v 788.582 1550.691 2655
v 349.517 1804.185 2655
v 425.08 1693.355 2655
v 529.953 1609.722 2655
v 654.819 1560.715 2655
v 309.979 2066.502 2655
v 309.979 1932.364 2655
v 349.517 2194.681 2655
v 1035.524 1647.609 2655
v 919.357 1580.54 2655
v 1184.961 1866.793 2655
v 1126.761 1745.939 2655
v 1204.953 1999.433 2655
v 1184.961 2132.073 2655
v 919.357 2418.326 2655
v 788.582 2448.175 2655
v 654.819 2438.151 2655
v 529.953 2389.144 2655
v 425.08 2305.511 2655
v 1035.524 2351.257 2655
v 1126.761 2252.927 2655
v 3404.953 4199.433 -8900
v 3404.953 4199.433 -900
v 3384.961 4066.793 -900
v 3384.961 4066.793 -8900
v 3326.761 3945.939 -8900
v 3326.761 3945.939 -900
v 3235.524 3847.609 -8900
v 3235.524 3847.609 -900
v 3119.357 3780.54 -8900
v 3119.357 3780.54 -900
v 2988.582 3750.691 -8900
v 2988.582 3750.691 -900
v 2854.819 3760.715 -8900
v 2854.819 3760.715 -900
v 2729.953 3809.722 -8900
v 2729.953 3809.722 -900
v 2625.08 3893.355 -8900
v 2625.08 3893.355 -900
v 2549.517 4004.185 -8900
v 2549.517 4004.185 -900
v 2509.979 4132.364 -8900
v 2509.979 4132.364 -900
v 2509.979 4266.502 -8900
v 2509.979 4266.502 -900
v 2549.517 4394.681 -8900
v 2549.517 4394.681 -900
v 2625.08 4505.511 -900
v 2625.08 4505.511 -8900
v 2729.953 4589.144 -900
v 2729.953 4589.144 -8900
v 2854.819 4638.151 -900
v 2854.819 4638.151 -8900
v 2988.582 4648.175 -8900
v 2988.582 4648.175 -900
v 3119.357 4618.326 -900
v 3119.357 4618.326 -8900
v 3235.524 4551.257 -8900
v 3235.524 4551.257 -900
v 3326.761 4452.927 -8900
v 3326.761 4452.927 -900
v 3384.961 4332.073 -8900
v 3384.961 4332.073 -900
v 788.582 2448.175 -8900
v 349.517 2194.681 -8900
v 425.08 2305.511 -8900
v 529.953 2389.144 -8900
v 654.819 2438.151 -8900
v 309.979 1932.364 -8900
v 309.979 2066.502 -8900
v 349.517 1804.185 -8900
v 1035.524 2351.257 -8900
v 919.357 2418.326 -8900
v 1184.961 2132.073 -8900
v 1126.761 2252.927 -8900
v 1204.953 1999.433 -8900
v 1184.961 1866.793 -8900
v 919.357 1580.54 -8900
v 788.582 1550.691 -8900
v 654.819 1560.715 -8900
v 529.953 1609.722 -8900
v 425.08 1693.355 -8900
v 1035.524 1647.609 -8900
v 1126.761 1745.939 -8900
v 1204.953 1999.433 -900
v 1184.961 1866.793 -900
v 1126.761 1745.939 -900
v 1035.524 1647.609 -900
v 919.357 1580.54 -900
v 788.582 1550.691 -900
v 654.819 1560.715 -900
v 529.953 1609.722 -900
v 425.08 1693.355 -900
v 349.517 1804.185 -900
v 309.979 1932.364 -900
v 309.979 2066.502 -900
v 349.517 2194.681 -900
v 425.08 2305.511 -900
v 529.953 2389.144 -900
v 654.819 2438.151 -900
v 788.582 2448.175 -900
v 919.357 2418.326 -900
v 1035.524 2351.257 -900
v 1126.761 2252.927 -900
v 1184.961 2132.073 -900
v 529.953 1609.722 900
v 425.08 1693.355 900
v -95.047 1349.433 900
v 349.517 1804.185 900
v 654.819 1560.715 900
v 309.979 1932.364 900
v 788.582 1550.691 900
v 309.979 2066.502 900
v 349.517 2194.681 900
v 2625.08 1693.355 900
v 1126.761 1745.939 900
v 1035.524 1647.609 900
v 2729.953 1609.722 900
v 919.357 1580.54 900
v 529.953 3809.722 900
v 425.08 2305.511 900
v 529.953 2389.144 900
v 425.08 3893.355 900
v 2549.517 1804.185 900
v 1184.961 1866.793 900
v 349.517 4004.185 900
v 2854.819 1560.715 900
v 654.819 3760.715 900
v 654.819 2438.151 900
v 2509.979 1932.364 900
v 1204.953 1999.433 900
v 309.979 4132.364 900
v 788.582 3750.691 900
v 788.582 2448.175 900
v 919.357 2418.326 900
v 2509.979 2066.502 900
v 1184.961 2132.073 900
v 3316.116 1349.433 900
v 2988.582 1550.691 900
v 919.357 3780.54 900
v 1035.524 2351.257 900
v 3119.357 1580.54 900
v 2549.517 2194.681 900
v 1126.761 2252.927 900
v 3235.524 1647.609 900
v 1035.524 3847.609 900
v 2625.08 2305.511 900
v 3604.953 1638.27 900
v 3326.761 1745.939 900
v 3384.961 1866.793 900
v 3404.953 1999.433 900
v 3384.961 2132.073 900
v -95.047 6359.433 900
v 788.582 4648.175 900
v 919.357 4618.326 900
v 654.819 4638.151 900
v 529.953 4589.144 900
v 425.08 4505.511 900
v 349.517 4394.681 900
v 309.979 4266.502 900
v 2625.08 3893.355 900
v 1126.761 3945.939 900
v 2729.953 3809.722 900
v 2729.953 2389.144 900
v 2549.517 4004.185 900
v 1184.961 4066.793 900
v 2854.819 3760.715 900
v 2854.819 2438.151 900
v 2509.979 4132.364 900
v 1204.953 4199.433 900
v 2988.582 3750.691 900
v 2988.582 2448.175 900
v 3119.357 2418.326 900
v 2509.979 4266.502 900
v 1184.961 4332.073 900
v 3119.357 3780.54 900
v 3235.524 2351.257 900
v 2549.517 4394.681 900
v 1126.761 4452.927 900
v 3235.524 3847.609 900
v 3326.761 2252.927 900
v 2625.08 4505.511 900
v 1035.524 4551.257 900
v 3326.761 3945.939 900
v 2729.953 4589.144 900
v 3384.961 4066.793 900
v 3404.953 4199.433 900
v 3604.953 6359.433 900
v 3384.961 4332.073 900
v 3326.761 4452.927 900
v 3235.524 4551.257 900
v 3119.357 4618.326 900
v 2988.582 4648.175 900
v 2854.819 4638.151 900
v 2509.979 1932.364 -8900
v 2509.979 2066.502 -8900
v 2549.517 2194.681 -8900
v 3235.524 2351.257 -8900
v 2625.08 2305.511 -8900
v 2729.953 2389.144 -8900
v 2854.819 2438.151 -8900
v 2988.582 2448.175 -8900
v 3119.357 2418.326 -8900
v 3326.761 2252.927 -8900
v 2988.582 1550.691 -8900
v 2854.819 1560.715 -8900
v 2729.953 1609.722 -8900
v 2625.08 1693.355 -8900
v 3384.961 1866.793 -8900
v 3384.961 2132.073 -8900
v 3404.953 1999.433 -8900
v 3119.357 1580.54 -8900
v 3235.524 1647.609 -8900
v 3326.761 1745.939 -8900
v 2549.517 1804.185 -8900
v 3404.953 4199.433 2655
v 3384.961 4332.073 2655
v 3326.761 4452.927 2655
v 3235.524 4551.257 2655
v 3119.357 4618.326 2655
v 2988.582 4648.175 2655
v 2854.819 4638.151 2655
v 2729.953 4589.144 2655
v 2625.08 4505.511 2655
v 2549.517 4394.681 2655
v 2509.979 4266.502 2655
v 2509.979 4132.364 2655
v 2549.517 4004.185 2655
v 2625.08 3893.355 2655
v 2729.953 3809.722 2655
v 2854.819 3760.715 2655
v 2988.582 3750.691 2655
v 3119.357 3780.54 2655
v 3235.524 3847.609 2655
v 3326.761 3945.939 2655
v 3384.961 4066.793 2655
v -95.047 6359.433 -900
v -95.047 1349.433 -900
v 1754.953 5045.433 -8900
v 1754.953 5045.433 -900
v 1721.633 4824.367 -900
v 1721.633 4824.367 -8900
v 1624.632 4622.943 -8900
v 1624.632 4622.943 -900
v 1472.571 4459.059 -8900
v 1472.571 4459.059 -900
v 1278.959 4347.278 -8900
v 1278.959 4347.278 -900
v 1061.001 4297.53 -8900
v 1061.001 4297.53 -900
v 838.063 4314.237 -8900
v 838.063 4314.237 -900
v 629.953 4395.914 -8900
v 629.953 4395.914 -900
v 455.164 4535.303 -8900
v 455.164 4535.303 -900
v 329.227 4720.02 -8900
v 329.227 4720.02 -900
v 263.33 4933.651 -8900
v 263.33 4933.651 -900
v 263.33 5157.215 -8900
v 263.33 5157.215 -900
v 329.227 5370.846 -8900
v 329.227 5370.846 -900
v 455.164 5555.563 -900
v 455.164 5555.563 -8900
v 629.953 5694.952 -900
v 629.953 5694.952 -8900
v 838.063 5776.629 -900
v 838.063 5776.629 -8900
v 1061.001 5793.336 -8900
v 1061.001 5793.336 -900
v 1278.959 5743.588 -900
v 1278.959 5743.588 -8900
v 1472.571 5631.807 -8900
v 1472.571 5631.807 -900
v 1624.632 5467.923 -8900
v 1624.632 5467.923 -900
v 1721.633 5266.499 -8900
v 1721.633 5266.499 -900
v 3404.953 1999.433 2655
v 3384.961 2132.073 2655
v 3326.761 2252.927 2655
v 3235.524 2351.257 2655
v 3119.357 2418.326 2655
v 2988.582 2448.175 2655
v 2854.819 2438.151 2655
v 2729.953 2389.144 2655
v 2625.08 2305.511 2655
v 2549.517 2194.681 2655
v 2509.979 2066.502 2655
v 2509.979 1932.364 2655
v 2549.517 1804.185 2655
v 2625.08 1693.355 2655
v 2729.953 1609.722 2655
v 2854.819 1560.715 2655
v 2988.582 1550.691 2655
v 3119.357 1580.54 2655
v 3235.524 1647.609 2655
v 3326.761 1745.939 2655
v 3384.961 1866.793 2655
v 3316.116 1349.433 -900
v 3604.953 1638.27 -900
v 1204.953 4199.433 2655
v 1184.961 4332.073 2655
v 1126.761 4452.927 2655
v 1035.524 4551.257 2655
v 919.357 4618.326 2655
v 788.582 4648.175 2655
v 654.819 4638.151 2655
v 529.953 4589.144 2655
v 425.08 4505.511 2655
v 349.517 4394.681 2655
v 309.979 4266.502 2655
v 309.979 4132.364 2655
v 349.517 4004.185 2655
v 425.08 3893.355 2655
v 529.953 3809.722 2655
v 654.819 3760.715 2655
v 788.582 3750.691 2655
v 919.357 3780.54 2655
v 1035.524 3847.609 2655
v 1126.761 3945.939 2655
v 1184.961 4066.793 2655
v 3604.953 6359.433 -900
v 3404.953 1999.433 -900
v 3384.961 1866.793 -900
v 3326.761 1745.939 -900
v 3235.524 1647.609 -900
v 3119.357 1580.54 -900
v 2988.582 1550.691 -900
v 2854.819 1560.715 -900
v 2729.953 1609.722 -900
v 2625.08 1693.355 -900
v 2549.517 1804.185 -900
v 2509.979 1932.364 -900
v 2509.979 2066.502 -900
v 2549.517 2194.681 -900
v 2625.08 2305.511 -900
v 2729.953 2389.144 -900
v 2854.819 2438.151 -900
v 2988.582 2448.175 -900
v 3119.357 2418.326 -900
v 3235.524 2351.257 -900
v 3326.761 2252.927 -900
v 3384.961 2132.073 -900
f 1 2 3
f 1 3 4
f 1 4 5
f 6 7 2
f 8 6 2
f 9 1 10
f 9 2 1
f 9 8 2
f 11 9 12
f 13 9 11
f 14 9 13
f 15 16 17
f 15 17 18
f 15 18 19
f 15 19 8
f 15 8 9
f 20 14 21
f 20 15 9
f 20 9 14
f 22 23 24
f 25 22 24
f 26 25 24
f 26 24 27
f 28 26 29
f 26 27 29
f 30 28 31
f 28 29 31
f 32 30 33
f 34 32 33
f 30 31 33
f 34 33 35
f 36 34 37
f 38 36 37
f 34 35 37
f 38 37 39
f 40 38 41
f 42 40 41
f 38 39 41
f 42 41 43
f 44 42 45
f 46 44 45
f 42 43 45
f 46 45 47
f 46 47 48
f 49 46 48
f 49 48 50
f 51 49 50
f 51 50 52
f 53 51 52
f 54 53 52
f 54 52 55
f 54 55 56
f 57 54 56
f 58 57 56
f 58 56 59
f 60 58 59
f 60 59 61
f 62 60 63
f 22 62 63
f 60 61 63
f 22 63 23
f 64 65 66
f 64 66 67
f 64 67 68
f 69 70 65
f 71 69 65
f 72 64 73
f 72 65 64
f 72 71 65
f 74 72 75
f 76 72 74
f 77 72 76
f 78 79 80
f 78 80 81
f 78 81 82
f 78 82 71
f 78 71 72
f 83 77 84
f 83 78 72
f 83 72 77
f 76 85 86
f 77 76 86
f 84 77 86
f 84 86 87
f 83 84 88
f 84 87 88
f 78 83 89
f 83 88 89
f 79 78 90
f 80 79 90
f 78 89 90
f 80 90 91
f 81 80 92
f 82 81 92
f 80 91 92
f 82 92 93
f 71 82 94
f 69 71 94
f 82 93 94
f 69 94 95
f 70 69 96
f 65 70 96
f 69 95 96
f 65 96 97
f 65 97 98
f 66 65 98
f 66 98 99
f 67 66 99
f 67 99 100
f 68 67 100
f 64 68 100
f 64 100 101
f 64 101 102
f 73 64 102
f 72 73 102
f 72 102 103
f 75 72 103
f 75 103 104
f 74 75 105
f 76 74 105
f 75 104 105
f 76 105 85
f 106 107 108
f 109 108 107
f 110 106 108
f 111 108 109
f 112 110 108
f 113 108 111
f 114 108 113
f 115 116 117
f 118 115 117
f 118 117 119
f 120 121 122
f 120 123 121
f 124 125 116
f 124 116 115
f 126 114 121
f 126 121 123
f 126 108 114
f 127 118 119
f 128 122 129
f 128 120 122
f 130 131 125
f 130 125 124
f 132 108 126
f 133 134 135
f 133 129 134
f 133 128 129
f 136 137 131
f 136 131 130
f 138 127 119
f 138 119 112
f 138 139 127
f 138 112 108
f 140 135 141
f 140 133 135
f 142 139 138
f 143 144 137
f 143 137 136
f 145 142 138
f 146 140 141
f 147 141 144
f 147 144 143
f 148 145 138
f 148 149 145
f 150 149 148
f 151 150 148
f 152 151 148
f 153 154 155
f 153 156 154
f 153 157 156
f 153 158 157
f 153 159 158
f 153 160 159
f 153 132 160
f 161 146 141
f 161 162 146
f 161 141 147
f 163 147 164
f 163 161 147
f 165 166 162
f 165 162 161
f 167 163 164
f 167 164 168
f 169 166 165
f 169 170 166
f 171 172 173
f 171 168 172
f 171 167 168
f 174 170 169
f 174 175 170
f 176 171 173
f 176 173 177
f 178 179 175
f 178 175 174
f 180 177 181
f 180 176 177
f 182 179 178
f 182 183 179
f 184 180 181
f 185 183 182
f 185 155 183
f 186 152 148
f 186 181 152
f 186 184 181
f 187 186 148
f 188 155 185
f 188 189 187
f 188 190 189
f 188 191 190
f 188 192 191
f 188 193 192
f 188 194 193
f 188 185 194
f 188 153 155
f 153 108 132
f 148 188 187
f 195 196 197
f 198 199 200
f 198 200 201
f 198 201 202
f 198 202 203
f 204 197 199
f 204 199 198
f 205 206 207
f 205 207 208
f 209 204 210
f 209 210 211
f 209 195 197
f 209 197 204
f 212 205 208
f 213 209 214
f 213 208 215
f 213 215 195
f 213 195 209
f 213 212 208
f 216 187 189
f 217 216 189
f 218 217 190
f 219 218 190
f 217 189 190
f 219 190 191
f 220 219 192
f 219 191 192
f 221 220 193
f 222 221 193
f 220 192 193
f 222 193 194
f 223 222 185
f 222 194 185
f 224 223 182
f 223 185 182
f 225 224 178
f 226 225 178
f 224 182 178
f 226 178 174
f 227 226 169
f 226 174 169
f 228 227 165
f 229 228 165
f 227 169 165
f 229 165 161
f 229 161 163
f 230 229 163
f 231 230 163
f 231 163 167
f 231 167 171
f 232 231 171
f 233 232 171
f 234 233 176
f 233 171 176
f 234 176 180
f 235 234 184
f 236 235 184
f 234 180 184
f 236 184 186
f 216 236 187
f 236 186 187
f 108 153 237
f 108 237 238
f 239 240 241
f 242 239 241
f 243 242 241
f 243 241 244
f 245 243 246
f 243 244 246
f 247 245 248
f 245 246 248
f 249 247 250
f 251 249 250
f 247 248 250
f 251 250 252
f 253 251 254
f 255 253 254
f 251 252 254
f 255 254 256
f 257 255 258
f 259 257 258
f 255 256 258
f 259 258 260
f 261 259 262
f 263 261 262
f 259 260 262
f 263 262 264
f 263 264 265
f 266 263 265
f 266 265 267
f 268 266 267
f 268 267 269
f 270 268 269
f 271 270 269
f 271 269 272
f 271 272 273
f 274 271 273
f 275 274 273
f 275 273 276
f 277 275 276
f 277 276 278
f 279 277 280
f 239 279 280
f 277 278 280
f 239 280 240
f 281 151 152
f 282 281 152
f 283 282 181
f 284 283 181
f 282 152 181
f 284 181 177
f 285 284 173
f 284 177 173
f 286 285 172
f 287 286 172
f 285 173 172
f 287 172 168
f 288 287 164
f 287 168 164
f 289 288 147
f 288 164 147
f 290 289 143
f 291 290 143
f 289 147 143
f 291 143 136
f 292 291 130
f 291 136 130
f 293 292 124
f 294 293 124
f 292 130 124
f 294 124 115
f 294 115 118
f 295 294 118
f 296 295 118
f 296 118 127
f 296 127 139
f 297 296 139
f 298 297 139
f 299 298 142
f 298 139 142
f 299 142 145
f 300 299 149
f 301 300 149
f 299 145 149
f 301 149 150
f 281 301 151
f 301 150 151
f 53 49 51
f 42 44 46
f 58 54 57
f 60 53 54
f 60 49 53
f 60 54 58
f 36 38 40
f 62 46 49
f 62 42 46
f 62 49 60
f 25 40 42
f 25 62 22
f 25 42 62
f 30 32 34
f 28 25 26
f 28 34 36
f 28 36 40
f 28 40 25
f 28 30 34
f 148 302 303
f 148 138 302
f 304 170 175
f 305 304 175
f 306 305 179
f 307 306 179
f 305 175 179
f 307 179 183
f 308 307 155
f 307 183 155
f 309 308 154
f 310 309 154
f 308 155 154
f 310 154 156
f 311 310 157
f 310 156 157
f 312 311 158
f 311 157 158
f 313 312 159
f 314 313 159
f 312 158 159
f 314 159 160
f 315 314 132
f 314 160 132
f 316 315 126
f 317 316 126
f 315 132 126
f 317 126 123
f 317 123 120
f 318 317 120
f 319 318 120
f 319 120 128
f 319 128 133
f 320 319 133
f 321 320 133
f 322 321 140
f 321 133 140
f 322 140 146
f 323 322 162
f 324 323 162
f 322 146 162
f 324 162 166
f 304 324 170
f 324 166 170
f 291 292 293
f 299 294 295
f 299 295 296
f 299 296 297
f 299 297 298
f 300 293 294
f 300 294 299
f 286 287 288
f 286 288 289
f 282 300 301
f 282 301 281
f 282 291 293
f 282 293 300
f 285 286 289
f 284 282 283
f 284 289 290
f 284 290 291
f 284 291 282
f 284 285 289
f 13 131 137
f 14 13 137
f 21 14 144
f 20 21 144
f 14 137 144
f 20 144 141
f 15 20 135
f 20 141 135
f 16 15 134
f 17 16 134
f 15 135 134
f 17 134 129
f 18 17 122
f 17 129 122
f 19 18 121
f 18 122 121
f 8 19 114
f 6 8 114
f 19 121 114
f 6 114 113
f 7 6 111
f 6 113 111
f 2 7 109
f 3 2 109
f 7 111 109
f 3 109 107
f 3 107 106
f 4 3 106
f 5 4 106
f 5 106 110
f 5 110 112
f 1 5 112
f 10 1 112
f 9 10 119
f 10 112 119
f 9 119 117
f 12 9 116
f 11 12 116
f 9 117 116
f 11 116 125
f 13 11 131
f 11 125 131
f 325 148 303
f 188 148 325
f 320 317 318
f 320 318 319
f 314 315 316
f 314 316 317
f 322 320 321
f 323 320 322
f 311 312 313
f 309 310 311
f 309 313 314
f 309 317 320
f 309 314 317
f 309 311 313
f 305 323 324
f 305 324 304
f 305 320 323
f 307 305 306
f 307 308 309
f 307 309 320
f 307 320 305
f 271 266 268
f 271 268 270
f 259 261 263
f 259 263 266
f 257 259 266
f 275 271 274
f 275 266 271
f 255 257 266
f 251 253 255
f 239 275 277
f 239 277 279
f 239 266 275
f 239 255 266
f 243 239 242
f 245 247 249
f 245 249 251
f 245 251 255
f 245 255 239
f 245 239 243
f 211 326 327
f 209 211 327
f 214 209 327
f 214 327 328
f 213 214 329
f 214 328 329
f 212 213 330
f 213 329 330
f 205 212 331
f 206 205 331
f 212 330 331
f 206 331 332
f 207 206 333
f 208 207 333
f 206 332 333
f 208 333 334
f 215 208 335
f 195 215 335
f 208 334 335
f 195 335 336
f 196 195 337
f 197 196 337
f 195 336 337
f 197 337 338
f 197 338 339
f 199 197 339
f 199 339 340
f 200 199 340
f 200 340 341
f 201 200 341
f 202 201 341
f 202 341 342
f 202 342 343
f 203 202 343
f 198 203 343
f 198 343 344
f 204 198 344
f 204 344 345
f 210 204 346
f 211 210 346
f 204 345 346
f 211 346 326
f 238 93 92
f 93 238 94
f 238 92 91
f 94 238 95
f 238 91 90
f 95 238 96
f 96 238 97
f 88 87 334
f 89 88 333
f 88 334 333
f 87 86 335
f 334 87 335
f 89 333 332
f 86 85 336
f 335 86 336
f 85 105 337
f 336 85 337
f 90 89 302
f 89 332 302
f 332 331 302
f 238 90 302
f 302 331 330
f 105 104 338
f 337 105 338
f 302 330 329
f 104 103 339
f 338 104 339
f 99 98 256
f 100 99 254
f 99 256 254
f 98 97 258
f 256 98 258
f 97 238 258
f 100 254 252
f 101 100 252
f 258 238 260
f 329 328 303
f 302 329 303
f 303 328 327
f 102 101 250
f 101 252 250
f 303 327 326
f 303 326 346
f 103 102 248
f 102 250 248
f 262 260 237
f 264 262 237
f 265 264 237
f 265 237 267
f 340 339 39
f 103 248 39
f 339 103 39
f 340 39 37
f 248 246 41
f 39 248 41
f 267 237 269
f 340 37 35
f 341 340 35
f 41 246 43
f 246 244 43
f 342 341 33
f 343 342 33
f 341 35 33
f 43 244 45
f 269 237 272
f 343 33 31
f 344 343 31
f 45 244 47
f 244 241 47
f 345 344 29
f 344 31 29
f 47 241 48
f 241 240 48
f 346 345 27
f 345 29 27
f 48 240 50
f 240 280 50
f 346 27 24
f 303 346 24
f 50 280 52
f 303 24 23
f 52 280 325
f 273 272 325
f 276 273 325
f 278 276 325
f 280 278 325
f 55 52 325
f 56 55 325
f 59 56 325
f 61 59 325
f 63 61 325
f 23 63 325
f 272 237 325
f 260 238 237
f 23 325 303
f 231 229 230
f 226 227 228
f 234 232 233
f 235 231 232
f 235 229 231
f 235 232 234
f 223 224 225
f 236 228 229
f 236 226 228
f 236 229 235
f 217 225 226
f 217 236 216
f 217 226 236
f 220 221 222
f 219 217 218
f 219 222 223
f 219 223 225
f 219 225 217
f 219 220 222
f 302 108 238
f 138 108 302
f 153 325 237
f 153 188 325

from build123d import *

# Parameters (mm, degrees)
F1_DEPTH = 900
F2_R     = 450
F3_DEPTH = 1755
F4_R     = 450
F4_R_2   = 750
F5_DEPTH = 8000


# Not quite as in the source:
# - the program builds the solid bodies; features that only make, move or delete a surface that nothing else refers to are left out


with BuildPart() as f1:
    # F0 (on Top) → F1 (new body, symmetric)
    with BuildSketch(Plane.XY):
        Polygon((3604.9533605576, 6359.4330211878), (-95.0466394424, 6359.4330211878), (-95.0466394424, 1349.4330211878), (3316.1160576543, 1349.4330211878), (3604.9533605576, 1638.270324091), align=None)
    extrude(amount=F1_DEPTH, both=True)

    # F2 (on face) → F3 (join)
    with BuildSketch(Plane.XY.offset(900)):
        with Locations((754.9533605576, 4199.4330211878)):
            Circle(F2_R)
        with Locations((754.9533605576, 1999.4330211878)):
            Circle(F2_R)
        with Locations((2954.9533605576, 4199.4330211878)):
            Circle(F2_R)
        with Locations((2954.9533605576, 1999.4330211878)):
            Circle(F2_R)
    extrude(amount=F3_DEPTH)

    # F4 (on face) → F5 (join)
    with BuildSketch(Plane(origin=(0, 0, -900), x_dir=(1, 0, 0), z_dir=(0, 0, -1))):
        with Locations((754.9533605576, -1999.4330211878)):
            Circle(F4_R)
        with Locations((2954.9533605576, -1999.4330211878)):
            Circle(F4_R)
        with Locations((2954.9533605576, -4199.4330211878)):
            Circle(F4_R)
        with Locations((1004.9533605576, -5045.4330211878)):
            Circle(F4_R_2)
    extrude(amount=F5_DEPTH)


solid = f1.part
